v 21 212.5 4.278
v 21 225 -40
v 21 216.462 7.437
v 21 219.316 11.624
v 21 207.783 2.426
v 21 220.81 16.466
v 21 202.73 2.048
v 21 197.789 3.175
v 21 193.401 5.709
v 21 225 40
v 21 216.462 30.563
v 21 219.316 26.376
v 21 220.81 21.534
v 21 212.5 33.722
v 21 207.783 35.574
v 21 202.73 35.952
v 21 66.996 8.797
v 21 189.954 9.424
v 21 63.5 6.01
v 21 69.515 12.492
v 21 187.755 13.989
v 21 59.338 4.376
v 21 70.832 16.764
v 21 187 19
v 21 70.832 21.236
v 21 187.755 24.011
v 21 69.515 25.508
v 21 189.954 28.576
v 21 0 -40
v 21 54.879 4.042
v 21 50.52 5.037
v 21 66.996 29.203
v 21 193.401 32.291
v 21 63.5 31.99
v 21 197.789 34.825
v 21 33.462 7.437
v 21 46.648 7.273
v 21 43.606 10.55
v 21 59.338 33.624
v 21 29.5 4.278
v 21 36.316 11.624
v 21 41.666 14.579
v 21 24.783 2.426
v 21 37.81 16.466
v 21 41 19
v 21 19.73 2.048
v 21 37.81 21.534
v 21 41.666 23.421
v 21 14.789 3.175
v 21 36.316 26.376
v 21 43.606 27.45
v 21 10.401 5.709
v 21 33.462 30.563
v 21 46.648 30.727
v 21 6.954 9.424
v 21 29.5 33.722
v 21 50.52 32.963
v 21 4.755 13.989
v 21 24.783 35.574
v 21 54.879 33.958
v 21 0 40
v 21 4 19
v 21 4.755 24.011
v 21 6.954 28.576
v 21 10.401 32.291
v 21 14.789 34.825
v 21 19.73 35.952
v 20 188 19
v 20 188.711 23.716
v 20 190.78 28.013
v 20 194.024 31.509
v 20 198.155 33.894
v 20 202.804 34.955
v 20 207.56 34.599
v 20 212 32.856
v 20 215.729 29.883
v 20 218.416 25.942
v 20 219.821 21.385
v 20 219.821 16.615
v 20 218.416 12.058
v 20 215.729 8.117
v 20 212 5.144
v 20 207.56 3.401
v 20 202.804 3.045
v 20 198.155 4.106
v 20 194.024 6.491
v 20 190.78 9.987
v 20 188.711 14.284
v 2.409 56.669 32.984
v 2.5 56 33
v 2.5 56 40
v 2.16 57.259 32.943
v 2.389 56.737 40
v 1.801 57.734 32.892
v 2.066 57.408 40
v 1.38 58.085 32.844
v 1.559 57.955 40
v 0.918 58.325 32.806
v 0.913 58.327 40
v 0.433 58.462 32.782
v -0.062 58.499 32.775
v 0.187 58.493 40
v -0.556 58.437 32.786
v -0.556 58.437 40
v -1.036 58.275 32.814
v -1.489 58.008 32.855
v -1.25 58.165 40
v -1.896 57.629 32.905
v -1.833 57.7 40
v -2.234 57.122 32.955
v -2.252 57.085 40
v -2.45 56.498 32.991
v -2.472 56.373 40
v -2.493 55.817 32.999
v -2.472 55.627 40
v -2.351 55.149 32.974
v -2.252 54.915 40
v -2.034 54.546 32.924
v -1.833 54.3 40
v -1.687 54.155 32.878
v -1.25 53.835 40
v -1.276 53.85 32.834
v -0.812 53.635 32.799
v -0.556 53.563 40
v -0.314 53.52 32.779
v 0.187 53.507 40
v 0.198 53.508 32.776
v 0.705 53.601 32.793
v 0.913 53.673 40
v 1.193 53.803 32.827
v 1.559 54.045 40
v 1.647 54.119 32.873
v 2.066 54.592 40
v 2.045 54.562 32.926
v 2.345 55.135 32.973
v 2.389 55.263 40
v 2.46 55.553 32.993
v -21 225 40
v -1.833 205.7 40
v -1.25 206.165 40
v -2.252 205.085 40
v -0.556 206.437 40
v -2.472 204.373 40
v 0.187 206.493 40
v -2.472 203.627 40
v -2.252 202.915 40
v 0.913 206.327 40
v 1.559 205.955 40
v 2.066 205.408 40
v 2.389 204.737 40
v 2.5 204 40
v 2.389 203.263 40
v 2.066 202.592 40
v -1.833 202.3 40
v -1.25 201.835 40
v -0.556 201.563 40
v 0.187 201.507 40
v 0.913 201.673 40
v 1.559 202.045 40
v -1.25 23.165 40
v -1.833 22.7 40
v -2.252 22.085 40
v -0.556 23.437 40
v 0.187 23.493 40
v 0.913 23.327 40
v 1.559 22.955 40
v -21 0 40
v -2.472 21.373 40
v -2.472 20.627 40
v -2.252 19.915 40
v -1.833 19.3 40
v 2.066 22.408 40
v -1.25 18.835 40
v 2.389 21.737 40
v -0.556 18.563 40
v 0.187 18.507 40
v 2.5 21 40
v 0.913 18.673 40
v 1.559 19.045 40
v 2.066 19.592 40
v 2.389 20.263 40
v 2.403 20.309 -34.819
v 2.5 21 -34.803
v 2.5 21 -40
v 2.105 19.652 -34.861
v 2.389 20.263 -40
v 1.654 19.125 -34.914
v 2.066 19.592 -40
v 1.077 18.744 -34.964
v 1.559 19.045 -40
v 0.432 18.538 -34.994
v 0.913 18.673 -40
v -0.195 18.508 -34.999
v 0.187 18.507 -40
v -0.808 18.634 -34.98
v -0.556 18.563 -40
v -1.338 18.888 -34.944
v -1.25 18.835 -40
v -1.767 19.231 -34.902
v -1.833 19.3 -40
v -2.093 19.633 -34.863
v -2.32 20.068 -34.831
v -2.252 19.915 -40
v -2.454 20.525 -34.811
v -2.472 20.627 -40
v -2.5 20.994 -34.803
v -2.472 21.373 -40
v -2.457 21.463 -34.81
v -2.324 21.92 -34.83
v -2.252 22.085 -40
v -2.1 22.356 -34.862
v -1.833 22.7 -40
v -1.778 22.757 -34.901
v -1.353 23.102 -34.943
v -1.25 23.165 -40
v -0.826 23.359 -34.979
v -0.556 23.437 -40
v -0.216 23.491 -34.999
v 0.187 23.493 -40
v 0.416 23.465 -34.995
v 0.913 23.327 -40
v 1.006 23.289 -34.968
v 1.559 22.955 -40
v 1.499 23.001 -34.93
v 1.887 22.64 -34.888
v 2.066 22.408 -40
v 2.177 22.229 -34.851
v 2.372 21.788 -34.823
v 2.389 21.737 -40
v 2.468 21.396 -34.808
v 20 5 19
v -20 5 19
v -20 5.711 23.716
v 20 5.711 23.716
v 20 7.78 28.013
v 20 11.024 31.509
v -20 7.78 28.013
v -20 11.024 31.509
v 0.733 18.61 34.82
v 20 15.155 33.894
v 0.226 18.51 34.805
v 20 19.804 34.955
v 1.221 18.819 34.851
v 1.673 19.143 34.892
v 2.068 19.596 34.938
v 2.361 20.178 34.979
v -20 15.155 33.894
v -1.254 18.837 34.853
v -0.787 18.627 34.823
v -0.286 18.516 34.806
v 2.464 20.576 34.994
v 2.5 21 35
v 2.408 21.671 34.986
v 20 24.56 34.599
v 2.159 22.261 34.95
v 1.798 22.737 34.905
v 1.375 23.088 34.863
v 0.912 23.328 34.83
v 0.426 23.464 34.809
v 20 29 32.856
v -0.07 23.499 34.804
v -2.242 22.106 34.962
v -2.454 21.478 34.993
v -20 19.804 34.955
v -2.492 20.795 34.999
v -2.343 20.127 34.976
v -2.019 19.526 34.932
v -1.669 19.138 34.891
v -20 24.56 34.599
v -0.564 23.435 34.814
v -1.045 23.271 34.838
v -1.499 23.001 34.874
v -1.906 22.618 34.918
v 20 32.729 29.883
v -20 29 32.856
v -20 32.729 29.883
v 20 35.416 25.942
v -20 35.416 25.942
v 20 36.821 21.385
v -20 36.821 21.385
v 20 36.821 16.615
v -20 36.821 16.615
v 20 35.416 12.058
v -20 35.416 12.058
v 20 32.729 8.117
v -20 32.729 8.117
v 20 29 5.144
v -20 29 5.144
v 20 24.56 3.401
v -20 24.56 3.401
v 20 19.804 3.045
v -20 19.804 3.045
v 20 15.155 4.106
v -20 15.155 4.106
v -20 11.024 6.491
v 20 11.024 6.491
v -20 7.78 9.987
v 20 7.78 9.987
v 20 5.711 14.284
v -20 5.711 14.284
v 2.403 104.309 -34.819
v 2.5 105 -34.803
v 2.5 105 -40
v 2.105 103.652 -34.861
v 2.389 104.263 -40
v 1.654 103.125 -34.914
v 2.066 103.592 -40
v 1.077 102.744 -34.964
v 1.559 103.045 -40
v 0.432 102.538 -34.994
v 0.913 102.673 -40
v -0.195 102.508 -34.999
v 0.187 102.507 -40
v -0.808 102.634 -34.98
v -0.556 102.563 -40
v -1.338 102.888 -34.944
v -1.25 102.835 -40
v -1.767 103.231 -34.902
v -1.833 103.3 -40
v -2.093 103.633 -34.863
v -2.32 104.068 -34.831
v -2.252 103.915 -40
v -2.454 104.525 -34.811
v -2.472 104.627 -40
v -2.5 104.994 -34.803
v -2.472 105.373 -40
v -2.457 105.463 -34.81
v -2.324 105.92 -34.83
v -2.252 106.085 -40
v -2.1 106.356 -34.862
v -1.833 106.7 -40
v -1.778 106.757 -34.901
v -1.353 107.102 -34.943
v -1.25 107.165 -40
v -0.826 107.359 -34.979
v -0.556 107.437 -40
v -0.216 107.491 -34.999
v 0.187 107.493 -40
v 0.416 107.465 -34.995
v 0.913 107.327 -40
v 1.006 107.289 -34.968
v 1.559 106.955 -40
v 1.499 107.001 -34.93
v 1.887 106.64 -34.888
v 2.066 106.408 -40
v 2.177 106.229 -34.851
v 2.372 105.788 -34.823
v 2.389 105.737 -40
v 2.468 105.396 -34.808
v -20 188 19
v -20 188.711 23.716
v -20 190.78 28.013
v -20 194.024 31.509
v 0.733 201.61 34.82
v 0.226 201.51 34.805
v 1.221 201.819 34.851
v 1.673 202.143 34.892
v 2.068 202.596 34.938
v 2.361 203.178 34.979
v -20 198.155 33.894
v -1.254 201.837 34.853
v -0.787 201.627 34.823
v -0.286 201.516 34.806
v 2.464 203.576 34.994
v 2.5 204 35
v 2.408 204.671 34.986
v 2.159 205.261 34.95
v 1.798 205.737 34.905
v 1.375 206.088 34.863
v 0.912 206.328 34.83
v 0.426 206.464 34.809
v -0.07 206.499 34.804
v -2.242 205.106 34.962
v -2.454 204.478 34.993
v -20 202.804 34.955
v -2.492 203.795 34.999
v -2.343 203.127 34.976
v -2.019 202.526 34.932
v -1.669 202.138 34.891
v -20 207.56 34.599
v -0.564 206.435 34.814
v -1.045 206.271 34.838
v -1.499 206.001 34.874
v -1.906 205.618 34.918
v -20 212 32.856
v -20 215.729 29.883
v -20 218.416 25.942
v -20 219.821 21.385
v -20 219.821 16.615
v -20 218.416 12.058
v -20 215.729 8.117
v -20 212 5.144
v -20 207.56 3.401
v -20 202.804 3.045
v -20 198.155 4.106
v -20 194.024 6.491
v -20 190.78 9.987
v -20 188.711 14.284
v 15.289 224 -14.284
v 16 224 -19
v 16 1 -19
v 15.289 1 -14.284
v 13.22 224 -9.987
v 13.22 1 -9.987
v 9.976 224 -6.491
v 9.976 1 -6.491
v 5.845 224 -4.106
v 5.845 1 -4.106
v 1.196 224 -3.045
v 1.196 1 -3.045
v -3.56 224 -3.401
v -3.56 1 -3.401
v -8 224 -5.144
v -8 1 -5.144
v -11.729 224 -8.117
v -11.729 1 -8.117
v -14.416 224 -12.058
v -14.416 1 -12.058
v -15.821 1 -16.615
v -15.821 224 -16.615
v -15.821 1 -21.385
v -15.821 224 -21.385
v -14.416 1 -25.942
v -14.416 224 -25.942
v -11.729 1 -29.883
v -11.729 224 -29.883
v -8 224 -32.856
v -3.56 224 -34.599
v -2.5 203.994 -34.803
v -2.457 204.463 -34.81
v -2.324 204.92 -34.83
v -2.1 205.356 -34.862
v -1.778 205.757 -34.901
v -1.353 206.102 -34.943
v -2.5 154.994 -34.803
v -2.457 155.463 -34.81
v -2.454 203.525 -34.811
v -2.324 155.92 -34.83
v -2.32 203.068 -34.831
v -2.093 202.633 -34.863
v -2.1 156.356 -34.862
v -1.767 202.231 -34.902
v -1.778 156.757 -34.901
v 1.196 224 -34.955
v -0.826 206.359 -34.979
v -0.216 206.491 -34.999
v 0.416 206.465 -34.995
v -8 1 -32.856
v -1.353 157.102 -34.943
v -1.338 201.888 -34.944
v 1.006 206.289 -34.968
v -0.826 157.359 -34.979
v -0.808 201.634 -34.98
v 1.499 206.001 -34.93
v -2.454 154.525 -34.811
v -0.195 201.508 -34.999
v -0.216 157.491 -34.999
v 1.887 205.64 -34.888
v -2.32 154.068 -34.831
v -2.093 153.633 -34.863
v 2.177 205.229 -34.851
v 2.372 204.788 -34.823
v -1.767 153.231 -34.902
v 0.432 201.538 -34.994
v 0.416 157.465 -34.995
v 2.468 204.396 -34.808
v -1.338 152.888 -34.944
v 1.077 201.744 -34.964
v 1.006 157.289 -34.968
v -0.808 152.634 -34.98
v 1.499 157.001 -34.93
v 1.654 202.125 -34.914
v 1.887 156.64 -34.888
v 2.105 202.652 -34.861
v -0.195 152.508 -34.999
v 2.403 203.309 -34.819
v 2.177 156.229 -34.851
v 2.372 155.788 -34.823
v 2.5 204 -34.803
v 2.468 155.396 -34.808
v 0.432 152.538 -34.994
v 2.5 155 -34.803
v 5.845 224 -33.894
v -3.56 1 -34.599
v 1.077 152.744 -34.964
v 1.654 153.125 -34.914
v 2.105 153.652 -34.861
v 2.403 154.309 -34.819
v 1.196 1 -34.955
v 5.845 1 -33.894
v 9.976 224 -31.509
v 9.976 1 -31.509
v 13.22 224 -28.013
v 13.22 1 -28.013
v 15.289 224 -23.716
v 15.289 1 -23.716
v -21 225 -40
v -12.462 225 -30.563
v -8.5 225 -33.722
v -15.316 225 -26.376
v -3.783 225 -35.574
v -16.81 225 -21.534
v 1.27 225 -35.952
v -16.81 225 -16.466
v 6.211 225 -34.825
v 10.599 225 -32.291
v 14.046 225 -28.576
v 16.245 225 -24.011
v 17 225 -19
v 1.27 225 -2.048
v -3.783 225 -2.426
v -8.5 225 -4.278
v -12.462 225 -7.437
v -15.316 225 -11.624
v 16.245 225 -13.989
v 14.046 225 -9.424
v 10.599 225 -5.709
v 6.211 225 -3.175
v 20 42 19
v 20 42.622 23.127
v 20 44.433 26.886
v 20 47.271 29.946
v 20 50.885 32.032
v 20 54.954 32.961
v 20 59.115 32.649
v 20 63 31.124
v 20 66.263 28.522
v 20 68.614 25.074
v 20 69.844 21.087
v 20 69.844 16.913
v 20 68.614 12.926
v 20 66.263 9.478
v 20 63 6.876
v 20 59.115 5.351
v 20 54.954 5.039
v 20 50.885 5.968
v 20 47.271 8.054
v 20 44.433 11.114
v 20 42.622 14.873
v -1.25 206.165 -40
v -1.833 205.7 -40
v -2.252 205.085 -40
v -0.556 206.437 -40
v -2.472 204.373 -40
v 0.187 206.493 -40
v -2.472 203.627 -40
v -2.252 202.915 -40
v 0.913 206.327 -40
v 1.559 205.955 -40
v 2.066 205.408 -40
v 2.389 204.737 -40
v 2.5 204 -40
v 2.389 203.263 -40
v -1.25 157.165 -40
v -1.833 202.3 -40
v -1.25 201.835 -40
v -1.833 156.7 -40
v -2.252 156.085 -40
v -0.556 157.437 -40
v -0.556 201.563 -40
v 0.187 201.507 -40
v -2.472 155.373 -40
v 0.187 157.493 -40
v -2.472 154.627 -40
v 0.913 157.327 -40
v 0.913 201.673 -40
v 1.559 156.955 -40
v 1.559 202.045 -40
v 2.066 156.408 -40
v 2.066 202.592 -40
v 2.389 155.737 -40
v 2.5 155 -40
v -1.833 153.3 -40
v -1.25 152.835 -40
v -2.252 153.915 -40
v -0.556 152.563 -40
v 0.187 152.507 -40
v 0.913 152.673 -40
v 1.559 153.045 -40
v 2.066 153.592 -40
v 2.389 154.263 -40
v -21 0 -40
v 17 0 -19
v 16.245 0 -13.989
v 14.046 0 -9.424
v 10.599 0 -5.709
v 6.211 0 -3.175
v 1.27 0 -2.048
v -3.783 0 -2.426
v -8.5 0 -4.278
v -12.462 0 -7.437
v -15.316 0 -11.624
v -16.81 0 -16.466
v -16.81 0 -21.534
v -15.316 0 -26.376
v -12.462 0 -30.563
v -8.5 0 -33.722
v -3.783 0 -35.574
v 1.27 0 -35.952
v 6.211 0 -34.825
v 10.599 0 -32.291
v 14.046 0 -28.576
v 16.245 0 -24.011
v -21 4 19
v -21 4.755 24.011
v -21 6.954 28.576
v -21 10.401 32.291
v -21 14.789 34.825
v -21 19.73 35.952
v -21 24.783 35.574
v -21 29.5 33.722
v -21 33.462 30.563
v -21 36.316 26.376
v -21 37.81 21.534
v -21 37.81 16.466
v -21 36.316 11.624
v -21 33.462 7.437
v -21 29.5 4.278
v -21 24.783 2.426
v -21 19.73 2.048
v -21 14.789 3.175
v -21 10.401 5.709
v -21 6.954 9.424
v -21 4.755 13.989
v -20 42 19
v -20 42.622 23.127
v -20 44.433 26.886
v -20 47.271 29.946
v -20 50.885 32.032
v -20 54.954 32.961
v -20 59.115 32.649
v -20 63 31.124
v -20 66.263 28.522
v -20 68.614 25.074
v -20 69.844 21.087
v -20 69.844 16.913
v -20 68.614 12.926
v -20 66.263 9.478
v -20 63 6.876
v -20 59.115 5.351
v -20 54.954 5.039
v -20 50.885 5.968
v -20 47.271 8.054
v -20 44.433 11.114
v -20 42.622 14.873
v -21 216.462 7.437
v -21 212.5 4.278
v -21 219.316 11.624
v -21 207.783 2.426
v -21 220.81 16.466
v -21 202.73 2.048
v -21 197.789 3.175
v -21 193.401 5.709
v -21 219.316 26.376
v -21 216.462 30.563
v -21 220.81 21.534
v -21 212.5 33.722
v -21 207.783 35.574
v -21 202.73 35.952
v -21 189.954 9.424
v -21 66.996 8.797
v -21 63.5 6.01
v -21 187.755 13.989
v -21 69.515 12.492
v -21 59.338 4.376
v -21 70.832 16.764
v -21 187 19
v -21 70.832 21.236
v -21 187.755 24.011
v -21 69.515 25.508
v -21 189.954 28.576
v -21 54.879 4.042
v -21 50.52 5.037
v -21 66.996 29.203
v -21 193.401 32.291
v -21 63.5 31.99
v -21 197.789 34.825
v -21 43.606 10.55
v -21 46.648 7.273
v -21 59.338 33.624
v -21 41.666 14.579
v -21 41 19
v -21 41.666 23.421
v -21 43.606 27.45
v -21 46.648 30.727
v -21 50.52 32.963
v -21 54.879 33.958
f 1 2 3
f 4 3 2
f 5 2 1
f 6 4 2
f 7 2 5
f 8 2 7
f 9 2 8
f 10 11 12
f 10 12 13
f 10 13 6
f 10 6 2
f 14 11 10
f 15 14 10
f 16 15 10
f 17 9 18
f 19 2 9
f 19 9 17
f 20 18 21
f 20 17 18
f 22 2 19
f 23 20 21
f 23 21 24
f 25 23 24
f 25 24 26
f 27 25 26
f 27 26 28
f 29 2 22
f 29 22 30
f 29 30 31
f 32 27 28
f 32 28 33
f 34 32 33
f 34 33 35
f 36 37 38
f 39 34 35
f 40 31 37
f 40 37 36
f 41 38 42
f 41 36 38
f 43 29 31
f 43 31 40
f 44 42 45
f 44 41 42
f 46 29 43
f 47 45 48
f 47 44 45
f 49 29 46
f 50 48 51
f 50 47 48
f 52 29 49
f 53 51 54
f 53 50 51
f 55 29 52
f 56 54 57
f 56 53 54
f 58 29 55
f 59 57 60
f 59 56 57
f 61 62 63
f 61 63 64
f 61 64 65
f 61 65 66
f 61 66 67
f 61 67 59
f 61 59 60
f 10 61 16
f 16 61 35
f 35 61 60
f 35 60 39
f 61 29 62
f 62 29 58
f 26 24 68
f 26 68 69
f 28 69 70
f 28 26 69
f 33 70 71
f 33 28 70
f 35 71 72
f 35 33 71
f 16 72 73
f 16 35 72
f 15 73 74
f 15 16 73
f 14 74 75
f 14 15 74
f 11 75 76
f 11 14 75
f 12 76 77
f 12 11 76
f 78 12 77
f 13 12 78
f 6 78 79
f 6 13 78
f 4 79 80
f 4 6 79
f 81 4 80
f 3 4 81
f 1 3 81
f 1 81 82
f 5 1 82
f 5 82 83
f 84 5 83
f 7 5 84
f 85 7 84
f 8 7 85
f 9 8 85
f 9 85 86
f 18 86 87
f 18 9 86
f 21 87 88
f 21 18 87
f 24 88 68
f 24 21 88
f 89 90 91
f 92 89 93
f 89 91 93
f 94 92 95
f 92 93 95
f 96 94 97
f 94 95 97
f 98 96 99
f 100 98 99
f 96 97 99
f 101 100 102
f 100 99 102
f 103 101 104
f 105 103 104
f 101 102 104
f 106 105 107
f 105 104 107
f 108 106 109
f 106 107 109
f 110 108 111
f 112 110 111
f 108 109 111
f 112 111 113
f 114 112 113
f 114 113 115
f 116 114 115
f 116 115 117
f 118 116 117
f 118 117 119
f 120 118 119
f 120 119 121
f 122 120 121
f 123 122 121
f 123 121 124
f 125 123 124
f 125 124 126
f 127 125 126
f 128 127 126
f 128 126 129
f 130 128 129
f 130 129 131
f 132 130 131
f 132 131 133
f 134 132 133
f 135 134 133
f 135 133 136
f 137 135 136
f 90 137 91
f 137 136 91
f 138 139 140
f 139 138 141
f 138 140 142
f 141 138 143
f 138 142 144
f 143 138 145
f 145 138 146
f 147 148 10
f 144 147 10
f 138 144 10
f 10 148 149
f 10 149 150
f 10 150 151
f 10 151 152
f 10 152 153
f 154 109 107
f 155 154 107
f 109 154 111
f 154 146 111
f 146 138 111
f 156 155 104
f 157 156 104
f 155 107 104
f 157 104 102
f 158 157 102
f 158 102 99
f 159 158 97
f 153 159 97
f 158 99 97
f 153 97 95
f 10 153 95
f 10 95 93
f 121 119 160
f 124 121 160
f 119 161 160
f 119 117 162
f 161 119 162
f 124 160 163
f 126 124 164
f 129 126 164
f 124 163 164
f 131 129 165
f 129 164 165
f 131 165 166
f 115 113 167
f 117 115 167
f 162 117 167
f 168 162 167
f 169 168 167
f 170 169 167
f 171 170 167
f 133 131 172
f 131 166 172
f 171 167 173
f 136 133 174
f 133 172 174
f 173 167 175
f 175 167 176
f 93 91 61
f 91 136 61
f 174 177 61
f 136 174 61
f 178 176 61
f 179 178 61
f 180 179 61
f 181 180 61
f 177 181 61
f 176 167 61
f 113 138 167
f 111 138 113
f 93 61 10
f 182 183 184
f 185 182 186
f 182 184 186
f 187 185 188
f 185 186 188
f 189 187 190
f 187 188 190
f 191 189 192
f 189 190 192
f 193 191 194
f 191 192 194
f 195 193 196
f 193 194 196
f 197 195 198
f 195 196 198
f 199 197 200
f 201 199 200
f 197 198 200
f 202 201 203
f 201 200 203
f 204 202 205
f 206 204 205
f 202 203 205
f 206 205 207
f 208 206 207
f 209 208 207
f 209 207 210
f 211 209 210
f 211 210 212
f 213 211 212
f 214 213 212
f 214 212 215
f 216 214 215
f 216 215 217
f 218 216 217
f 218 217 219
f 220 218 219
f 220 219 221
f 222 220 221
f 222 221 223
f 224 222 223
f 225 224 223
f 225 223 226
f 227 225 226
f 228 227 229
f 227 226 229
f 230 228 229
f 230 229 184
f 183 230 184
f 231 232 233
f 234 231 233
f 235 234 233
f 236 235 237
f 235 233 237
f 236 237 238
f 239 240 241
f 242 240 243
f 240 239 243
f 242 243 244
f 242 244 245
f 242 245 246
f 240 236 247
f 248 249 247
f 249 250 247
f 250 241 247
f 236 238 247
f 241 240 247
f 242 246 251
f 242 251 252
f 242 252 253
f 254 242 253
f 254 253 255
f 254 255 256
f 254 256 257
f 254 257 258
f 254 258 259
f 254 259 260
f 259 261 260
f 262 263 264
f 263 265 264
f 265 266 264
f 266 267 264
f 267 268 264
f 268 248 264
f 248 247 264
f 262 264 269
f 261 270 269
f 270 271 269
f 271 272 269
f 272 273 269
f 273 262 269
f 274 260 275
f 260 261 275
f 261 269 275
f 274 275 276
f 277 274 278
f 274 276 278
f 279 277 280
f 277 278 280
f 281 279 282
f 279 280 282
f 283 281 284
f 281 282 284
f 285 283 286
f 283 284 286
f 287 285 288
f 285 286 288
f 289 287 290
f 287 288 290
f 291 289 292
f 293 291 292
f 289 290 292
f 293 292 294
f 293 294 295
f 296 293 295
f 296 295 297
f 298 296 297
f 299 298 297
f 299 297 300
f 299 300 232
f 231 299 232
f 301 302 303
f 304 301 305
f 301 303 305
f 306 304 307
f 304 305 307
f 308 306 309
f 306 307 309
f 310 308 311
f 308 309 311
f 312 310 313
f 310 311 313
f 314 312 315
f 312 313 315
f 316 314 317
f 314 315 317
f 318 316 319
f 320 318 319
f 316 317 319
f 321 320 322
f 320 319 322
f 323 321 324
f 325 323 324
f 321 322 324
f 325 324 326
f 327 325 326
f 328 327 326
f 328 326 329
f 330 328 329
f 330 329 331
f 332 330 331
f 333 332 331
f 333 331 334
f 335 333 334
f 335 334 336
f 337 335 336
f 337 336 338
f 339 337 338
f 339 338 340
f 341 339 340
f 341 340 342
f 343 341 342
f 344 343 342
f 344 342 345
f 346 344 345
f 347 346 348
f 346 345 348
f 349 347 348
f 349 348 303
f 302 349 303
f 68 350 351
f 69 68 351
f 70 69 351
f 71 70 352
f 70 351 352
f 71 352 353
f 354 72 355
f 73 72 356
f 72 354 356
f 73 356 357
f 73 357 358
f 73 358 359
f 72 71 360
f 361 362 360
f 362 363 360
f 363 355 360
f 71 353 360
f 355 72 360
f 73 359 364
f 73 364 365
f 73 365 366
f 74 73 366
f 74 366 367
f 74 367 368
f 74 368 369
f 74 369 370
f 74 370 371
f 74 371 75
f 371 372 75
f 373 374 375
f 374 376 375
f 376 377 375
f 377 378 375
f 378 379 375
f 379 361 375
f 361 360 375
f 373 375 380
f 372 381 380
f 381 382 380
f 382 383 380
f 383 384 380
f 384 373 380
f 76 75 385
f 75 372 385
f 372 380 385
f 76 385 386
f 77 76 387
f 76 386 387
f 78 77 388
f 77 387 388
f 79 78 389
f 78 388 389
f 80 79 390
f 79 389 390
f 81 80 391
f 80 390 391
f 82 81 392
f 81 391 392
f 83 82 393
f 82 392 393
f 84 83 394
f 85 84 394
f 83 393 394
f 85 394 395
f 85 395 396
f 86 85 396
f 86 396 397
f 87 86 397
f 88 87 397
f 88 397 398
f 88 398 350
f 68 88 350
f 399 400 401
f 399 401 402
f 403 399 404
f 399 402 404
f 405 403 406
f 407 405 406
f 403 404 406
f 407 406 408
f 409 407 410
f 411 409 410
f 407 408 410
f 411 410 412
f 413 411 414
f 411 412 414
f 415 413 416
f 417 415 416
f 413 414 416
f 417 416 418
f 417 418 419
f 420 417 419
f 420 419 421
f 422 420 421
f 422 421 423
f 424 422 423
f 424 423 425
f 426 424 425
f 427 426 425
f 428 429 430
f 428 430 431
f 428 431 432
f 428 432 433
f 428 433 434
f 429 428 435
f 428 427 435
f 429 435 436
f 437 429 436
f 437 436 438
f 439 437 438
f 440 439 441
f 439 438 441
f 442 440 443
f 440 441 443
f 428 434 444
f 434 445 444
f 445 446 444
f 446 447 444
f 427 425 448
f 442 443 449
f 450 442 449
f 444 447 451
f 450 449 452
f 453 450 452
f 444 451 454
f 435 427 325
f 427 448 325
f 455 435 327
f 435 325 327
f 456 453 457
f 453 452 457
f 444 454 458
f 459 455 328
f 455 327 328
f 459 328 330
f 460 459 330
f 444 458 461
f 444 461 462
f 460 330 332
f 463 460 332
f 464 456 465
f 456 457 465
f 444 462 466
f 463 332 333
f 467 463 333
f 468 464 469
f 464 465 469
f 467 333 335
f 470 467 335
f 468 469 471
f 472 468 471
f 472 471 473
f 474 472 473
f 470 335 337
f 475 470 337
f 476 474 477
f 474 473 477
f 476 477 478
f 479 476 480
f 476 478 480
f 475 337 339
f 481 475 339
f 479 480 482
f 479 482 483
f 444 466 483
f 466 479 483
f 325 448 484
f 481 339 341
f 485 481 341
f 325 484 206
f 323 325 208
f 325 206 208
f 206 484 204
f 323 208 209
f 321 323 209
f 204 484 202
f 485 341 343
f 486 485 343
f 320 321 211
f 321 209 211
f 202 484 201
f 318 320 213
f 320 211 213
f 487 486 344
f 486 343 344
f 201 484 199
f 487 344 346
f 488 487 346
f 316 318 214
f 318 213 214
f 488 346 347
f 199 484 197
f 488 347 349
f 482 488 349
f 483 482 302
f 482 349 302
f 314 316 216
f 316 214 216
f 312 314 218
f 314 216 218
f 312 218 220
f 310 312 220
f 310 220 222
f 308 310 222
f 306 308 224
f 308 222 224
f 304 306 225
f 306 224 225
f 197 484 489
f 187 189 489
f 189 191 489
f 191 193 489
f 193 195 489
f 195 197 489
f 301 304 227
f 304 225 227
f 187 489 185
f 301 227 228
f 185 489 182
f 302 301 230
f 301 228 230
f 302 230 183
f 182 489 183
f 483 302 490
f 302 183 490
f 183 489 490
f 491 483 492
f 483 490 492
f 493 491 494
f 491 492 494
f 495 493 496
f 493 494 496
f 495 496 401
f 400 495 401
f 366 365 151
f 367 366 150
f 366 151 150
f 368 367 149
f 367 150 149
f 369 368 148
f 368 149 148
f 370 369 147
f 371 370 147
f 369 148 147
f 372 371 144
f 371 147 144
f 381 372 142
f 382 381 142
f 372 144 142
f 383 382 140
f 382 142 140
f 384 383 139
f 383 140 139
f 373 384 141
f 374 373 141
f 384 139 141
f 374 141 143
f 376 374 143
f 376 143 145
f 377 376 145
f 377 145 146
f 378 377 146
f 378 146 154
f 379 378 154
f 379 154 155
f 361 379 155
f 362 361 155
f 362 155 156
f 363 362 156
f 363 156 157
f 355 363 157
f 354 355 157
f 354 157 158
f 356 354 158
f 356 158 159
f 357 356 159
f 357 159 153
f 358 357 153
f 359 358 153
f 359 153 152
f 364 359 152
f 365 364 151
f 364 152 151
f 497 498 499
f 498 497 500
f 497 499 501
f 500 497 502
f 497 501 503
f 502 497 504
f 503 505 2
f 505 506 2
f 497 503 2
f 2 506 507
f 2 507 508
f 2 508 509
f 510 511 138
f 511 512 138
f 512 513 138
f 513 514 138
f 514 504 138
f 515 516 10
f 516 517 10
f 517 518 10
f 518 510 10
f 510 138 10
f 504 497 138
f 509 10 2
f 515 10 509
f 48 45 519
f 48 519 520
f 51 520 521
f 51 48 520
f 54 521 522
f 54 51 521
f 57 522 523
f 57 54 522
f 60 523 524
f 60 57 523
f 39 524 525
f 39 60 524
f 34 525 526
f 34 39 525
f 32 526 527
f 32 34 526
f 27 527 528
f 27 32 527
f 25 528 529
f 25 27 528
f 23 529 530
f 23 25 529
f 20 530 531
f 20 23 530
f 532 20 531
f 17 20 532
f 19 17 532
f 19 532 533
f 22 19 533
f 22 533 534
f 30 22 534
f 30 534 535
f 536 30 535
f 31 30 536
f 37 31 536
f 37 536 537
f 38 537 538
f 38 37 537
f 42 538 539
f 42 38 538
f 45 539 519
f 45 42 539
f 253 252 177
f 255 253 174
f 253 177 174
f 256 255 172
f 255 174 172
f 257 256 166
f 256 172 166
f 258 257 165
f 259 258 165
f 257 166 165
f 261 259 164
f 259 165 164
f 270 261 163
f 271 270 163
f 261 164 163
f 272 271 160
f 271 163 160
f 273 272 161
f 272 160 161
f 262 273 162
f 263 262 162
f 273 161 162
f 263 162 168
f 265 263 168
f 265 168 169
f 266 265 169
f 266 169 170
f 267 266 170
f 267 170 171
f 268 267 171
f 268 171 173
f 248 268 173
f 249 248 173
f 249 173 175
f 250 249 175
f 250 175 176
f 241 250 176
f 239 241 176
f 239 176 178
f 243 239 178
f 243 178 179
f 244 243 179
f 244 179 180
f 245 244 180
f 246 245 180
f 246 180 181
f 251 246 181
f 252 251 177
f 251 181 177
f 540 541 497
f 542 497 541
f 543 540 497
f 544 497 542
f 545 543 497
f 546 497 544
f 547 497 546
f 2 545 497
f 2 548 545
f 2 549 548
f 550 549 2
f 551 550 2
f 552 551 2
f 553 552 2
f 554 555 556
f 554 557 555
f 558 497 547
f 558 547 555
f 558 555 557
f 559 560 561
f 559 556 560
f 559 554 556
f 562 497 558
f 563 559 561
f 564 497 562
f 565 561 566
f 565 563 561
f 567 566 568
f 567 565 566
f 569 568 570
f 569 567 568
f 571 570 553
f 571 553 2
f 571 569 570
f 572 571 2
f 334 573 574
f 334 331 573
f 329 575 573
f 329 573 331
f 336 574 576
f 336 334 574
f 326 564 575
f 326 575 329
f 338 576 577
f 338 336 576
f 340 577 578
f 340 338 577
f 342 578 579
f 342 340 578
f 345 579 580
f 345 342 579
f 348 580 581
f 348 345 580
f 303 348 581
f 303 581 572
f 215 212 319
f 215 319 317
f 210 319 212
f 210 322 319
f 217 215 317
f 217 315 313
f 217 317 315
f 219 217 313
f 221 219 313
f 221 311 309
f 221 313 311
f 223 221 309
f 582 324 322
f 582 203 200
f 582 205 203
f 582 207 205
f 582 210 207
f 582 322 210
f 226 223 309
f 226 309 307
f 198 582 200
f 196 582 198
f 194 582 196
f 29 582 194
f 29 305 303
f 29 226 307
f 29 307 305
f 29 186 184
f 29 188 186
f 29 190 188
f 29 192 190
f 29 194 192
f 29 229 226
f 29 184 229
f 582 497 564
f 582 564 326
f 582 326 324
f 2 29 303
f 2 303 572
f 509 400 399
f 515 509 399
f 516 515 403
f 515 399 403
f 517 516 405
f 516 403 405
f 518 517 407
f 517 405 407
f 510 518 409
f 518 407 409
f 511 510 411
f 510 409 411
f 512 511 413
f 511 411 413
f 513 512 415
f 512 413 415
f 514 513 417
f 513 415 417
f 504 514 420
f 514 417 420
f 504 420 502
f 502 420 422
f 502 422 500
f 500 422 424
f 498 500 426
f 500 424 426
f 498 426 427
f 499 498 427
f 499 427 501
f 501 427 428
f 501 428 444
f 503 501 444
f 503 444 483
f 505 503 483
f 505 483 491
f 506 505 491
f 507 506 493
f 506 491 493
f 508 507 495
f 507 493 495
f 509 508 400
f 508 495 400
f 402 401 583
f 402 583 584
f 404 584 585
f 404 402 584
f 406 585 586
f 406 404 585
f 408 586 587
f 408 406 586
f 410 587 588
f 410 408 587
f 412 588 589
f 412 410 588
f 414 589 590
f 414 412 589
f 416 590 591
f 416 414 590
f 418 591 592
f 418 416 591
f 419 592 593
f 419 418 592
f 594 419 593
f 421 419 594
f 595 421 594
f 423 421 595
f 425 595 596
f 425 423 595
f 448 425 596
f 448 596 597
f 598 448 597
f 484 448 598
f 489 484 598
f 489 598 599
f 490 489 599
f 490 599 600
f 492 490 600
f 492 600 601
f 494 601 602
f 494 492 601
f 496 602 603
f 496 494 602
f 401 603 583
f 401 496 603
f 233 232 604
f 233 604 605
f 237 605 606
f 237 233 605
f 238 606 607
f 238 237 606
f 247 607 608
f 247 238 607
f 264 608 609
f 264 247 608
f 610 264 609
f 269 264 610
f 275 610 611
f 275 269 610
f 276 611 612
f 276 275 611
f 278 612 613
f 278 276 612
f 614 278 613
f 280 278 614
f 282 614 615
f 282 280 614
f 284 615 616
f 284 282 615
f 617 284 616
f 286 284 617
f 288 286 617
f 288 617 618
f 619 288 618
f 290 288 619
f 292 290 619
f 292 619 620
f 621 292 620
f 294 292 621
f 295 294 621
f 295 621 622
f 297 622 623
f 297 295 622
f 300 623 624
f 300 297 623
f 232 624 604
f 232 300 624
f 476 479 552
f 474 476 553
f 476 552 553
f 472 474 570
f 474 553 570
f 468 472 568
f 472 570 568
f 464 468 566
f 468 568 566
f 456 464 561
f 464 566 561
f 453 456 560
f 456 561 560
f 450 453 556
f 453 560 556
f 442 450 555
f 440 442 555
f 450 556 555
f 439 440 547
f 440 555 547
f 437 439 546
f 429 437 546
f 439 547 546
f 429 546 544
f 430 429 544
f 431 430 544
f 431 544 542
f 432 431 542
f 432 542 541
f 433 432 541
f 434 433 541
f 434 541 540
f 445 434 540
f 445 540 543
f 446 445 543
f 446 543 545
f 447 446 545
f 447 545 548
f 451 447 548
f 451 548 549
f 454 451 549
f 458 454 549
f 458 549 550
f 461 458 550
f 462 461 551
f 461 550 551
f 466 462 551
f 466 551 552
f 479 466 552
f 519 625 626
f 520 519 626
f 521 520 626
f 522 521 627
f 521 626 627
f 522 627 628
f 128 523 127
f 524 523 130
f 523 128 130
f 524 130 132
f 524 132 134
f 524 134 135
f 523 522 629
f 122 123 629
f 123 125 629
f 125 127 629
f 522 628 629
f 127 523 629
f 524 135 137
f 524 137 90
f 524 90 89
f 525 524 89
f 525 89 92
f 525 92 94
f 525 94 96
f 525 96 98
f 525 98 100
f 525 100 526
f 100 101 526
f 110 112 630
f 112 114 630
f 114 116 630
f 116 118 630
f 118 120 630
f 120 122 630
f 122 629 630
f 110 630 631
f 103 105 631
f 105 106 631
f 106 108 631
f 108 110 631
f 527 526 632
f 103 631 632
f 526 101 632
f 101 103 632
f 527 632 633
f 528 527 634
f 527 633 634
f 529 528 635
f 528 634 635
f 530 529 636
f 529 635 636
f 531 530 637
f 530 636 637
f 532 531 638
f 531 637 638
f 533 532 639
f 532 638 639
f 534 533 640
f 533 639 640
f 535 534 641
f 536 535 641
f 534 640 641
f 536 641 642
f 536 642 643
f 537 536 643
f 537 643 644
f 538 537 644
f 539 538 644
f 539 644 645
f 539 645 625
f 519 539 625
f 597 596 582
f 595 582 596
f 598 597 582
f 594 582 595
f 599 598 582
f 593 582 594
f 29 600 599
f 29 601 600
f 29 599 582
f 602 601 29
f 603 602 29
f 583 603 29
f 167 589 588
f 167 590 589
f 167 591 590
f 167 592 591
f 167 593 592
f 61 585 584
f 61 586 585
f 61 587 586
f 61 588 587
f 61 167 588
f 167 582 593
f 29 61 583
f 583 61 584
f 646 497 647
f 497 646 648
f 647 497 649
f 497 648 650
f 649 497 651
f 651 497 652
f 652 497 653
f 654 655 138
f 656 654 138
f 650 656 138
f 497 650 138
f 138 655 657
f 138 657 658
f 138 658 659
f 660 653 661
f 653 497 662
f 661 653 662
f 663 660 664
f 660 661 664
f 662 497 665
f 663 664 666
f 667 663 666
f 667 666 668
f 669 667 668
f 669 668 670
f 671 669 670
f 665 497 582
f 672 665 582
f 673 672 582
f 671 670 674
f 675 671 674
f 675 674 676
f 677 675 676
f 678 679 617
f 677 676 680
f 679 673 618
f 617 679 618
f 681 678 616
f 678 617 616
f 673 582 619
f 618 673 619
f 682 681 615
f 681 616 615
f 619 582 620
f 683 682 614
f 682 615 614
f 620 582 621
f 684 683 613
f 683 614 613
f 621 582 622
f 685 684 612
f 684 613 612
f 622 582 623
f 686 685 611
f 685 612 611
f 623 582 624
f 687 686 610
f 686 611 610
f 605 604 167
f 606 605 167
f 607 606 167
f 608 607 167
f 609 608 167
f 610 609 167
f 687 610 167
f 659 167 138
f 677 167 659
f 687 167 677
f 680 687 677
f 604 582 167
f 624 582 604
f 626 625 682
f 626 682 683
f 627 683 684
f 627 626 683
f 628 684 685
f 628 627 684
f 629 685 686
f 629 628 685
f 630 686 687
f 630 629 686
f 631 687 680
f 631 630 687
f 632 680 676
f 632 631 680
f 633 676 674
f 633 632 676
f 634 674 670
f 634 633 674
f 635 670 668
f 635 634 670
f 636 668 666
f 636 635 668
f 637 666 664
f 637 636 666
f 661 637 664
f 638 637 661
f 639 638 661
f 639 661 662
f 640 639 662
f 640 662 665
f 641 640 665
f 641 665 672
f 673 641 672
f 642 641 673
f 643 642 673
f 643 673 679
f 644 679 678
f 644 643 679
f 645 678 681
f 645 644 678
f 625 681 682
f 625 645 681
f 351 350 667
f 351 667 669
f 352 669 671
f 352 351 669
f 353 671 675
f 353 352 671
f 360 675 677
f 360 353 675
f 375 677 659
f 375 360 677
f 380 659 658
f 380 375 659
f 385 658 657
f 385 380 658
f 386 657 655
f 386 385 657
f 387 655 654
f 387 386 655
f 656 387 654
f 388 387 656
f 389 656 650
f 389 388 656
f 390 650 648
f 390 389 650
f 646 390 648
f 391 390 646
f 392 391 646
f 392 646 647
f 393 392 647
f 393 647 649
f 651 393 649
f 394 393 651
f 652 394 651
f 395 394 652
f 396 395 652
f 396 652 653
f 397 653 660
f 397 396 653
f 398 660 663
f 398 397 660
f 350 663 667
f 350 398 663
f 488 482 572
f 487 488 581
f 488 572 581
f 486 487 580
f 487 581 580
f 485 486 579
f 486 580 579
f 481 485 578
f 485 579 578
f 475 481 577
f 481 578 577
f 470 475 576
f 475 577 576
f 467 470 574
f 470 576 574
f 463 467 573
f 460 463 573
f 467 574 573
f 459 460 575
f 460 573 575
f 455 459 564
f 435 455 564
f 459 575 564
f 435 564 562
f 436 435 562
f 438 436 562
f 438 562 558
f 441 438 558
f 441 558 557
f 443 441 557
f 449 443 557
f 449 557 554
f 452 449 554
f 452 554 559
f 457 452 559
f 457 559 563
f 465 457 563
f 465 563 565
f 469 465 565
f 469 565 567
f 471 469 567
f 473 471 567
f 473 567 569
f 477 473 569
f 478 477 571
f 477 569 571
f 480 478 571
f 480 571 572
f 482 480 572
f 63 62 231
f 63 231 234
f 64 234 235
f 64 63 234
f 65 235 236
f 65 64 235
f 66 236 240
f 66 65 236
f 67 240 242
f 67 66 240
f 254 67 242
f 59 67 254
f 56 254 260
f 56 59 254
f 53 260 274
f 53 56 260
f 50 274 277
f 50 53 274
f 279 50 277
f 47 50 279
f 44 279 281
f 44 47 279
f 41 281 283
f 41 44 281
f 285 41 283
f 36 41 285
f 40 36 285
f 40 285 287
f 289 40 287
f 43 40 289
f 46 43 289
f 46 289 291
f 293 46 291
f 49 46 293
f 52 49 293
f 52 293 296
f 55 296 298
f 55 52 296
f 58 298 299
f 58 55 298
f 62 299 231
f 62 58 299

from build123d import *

# Parameters (mm, degrees)
F0_W     = 42
F0_H     = 80
F0_R     = 16
F1_DEPTH = 225
F2_R     = 16
F2_R_2   = 14
F3_DEPTH = 100
F4_R     = 2.5
F5_DEPTH = 25
F6_R     = 2.5
F7_DEPTH = 25
F8_SIZE  = 1


with BuildPart() as f1:
    # F0 (on Front) → F1 (new body)
    with BuildSketch(Plane.XZ):
        Rectangle(F0_W, F0_H)
        with Locations((0, -19)):
            Circle(F0_R, mode=Mode.SUBTRACT)
    extrude(amount=-F1_DEPTH)

    # F2 (on face) → F3 (cut)
    with BuildSketch(Plane(origin=(-21, 0, 0), x_dir=(0, -1, 0), z_dir=(-1, 0, 0))):
        with Locations((-204, 19)):
            Circle(F2_R)
        with Locations((-56, 19)):
            Circle(F2_R_2)
        with Locations((-21, 19)):
            Circle(F2_R)
    extrude(amount=-F3_DEPTH, mode=Mode.SUBTRACT)

    # F4 (on face) → F5 (cut)
    with BuildSketch(Plane.XY.offset(40)):
        with Locations((0, 21)):
            Circle(F4_R)
        with Locations((0, 56)):
            Circle(F4_R)
        with Locations((0, 204)):
            Circle(F4_R)
    extrude(amount=-F5_DEPTH, mode=Mode.SUBTRACT)

    # F6 (on face) → F7 (cut)
    with BuildSketch(Plane(origin=(0, 0, -40), x_dir=(1, 0, 0), z_dir=(0, 0, -1))):
        with Locations((0, -21)):
            Circle(F6_R)
        with Locations((0, -204)):
            Circle(F6_R)
        with Locations((0, -105)):
            Circle(F6_R)
        with Locations((0, -155)):
            Circle(F6_R)
    extrude(amount=-F7_DEPTH, mode=Mode.SUBTRACT)

    # F8
    f8_edges = [f1.edges().sort_by_distance(p)[0] for p in [
        (-21, 70, 19),
        (-21, 37, 19),
        (-16, 0, -19),
        (-21, 220, 19),
        (21, 37, 19),
        (21, 70, 19),
        (21, 220, 19),
        (-16, 225, -19),
    ]]
    chamfer(f8_edges, length=F8_SIZE)


solid = f1.part
